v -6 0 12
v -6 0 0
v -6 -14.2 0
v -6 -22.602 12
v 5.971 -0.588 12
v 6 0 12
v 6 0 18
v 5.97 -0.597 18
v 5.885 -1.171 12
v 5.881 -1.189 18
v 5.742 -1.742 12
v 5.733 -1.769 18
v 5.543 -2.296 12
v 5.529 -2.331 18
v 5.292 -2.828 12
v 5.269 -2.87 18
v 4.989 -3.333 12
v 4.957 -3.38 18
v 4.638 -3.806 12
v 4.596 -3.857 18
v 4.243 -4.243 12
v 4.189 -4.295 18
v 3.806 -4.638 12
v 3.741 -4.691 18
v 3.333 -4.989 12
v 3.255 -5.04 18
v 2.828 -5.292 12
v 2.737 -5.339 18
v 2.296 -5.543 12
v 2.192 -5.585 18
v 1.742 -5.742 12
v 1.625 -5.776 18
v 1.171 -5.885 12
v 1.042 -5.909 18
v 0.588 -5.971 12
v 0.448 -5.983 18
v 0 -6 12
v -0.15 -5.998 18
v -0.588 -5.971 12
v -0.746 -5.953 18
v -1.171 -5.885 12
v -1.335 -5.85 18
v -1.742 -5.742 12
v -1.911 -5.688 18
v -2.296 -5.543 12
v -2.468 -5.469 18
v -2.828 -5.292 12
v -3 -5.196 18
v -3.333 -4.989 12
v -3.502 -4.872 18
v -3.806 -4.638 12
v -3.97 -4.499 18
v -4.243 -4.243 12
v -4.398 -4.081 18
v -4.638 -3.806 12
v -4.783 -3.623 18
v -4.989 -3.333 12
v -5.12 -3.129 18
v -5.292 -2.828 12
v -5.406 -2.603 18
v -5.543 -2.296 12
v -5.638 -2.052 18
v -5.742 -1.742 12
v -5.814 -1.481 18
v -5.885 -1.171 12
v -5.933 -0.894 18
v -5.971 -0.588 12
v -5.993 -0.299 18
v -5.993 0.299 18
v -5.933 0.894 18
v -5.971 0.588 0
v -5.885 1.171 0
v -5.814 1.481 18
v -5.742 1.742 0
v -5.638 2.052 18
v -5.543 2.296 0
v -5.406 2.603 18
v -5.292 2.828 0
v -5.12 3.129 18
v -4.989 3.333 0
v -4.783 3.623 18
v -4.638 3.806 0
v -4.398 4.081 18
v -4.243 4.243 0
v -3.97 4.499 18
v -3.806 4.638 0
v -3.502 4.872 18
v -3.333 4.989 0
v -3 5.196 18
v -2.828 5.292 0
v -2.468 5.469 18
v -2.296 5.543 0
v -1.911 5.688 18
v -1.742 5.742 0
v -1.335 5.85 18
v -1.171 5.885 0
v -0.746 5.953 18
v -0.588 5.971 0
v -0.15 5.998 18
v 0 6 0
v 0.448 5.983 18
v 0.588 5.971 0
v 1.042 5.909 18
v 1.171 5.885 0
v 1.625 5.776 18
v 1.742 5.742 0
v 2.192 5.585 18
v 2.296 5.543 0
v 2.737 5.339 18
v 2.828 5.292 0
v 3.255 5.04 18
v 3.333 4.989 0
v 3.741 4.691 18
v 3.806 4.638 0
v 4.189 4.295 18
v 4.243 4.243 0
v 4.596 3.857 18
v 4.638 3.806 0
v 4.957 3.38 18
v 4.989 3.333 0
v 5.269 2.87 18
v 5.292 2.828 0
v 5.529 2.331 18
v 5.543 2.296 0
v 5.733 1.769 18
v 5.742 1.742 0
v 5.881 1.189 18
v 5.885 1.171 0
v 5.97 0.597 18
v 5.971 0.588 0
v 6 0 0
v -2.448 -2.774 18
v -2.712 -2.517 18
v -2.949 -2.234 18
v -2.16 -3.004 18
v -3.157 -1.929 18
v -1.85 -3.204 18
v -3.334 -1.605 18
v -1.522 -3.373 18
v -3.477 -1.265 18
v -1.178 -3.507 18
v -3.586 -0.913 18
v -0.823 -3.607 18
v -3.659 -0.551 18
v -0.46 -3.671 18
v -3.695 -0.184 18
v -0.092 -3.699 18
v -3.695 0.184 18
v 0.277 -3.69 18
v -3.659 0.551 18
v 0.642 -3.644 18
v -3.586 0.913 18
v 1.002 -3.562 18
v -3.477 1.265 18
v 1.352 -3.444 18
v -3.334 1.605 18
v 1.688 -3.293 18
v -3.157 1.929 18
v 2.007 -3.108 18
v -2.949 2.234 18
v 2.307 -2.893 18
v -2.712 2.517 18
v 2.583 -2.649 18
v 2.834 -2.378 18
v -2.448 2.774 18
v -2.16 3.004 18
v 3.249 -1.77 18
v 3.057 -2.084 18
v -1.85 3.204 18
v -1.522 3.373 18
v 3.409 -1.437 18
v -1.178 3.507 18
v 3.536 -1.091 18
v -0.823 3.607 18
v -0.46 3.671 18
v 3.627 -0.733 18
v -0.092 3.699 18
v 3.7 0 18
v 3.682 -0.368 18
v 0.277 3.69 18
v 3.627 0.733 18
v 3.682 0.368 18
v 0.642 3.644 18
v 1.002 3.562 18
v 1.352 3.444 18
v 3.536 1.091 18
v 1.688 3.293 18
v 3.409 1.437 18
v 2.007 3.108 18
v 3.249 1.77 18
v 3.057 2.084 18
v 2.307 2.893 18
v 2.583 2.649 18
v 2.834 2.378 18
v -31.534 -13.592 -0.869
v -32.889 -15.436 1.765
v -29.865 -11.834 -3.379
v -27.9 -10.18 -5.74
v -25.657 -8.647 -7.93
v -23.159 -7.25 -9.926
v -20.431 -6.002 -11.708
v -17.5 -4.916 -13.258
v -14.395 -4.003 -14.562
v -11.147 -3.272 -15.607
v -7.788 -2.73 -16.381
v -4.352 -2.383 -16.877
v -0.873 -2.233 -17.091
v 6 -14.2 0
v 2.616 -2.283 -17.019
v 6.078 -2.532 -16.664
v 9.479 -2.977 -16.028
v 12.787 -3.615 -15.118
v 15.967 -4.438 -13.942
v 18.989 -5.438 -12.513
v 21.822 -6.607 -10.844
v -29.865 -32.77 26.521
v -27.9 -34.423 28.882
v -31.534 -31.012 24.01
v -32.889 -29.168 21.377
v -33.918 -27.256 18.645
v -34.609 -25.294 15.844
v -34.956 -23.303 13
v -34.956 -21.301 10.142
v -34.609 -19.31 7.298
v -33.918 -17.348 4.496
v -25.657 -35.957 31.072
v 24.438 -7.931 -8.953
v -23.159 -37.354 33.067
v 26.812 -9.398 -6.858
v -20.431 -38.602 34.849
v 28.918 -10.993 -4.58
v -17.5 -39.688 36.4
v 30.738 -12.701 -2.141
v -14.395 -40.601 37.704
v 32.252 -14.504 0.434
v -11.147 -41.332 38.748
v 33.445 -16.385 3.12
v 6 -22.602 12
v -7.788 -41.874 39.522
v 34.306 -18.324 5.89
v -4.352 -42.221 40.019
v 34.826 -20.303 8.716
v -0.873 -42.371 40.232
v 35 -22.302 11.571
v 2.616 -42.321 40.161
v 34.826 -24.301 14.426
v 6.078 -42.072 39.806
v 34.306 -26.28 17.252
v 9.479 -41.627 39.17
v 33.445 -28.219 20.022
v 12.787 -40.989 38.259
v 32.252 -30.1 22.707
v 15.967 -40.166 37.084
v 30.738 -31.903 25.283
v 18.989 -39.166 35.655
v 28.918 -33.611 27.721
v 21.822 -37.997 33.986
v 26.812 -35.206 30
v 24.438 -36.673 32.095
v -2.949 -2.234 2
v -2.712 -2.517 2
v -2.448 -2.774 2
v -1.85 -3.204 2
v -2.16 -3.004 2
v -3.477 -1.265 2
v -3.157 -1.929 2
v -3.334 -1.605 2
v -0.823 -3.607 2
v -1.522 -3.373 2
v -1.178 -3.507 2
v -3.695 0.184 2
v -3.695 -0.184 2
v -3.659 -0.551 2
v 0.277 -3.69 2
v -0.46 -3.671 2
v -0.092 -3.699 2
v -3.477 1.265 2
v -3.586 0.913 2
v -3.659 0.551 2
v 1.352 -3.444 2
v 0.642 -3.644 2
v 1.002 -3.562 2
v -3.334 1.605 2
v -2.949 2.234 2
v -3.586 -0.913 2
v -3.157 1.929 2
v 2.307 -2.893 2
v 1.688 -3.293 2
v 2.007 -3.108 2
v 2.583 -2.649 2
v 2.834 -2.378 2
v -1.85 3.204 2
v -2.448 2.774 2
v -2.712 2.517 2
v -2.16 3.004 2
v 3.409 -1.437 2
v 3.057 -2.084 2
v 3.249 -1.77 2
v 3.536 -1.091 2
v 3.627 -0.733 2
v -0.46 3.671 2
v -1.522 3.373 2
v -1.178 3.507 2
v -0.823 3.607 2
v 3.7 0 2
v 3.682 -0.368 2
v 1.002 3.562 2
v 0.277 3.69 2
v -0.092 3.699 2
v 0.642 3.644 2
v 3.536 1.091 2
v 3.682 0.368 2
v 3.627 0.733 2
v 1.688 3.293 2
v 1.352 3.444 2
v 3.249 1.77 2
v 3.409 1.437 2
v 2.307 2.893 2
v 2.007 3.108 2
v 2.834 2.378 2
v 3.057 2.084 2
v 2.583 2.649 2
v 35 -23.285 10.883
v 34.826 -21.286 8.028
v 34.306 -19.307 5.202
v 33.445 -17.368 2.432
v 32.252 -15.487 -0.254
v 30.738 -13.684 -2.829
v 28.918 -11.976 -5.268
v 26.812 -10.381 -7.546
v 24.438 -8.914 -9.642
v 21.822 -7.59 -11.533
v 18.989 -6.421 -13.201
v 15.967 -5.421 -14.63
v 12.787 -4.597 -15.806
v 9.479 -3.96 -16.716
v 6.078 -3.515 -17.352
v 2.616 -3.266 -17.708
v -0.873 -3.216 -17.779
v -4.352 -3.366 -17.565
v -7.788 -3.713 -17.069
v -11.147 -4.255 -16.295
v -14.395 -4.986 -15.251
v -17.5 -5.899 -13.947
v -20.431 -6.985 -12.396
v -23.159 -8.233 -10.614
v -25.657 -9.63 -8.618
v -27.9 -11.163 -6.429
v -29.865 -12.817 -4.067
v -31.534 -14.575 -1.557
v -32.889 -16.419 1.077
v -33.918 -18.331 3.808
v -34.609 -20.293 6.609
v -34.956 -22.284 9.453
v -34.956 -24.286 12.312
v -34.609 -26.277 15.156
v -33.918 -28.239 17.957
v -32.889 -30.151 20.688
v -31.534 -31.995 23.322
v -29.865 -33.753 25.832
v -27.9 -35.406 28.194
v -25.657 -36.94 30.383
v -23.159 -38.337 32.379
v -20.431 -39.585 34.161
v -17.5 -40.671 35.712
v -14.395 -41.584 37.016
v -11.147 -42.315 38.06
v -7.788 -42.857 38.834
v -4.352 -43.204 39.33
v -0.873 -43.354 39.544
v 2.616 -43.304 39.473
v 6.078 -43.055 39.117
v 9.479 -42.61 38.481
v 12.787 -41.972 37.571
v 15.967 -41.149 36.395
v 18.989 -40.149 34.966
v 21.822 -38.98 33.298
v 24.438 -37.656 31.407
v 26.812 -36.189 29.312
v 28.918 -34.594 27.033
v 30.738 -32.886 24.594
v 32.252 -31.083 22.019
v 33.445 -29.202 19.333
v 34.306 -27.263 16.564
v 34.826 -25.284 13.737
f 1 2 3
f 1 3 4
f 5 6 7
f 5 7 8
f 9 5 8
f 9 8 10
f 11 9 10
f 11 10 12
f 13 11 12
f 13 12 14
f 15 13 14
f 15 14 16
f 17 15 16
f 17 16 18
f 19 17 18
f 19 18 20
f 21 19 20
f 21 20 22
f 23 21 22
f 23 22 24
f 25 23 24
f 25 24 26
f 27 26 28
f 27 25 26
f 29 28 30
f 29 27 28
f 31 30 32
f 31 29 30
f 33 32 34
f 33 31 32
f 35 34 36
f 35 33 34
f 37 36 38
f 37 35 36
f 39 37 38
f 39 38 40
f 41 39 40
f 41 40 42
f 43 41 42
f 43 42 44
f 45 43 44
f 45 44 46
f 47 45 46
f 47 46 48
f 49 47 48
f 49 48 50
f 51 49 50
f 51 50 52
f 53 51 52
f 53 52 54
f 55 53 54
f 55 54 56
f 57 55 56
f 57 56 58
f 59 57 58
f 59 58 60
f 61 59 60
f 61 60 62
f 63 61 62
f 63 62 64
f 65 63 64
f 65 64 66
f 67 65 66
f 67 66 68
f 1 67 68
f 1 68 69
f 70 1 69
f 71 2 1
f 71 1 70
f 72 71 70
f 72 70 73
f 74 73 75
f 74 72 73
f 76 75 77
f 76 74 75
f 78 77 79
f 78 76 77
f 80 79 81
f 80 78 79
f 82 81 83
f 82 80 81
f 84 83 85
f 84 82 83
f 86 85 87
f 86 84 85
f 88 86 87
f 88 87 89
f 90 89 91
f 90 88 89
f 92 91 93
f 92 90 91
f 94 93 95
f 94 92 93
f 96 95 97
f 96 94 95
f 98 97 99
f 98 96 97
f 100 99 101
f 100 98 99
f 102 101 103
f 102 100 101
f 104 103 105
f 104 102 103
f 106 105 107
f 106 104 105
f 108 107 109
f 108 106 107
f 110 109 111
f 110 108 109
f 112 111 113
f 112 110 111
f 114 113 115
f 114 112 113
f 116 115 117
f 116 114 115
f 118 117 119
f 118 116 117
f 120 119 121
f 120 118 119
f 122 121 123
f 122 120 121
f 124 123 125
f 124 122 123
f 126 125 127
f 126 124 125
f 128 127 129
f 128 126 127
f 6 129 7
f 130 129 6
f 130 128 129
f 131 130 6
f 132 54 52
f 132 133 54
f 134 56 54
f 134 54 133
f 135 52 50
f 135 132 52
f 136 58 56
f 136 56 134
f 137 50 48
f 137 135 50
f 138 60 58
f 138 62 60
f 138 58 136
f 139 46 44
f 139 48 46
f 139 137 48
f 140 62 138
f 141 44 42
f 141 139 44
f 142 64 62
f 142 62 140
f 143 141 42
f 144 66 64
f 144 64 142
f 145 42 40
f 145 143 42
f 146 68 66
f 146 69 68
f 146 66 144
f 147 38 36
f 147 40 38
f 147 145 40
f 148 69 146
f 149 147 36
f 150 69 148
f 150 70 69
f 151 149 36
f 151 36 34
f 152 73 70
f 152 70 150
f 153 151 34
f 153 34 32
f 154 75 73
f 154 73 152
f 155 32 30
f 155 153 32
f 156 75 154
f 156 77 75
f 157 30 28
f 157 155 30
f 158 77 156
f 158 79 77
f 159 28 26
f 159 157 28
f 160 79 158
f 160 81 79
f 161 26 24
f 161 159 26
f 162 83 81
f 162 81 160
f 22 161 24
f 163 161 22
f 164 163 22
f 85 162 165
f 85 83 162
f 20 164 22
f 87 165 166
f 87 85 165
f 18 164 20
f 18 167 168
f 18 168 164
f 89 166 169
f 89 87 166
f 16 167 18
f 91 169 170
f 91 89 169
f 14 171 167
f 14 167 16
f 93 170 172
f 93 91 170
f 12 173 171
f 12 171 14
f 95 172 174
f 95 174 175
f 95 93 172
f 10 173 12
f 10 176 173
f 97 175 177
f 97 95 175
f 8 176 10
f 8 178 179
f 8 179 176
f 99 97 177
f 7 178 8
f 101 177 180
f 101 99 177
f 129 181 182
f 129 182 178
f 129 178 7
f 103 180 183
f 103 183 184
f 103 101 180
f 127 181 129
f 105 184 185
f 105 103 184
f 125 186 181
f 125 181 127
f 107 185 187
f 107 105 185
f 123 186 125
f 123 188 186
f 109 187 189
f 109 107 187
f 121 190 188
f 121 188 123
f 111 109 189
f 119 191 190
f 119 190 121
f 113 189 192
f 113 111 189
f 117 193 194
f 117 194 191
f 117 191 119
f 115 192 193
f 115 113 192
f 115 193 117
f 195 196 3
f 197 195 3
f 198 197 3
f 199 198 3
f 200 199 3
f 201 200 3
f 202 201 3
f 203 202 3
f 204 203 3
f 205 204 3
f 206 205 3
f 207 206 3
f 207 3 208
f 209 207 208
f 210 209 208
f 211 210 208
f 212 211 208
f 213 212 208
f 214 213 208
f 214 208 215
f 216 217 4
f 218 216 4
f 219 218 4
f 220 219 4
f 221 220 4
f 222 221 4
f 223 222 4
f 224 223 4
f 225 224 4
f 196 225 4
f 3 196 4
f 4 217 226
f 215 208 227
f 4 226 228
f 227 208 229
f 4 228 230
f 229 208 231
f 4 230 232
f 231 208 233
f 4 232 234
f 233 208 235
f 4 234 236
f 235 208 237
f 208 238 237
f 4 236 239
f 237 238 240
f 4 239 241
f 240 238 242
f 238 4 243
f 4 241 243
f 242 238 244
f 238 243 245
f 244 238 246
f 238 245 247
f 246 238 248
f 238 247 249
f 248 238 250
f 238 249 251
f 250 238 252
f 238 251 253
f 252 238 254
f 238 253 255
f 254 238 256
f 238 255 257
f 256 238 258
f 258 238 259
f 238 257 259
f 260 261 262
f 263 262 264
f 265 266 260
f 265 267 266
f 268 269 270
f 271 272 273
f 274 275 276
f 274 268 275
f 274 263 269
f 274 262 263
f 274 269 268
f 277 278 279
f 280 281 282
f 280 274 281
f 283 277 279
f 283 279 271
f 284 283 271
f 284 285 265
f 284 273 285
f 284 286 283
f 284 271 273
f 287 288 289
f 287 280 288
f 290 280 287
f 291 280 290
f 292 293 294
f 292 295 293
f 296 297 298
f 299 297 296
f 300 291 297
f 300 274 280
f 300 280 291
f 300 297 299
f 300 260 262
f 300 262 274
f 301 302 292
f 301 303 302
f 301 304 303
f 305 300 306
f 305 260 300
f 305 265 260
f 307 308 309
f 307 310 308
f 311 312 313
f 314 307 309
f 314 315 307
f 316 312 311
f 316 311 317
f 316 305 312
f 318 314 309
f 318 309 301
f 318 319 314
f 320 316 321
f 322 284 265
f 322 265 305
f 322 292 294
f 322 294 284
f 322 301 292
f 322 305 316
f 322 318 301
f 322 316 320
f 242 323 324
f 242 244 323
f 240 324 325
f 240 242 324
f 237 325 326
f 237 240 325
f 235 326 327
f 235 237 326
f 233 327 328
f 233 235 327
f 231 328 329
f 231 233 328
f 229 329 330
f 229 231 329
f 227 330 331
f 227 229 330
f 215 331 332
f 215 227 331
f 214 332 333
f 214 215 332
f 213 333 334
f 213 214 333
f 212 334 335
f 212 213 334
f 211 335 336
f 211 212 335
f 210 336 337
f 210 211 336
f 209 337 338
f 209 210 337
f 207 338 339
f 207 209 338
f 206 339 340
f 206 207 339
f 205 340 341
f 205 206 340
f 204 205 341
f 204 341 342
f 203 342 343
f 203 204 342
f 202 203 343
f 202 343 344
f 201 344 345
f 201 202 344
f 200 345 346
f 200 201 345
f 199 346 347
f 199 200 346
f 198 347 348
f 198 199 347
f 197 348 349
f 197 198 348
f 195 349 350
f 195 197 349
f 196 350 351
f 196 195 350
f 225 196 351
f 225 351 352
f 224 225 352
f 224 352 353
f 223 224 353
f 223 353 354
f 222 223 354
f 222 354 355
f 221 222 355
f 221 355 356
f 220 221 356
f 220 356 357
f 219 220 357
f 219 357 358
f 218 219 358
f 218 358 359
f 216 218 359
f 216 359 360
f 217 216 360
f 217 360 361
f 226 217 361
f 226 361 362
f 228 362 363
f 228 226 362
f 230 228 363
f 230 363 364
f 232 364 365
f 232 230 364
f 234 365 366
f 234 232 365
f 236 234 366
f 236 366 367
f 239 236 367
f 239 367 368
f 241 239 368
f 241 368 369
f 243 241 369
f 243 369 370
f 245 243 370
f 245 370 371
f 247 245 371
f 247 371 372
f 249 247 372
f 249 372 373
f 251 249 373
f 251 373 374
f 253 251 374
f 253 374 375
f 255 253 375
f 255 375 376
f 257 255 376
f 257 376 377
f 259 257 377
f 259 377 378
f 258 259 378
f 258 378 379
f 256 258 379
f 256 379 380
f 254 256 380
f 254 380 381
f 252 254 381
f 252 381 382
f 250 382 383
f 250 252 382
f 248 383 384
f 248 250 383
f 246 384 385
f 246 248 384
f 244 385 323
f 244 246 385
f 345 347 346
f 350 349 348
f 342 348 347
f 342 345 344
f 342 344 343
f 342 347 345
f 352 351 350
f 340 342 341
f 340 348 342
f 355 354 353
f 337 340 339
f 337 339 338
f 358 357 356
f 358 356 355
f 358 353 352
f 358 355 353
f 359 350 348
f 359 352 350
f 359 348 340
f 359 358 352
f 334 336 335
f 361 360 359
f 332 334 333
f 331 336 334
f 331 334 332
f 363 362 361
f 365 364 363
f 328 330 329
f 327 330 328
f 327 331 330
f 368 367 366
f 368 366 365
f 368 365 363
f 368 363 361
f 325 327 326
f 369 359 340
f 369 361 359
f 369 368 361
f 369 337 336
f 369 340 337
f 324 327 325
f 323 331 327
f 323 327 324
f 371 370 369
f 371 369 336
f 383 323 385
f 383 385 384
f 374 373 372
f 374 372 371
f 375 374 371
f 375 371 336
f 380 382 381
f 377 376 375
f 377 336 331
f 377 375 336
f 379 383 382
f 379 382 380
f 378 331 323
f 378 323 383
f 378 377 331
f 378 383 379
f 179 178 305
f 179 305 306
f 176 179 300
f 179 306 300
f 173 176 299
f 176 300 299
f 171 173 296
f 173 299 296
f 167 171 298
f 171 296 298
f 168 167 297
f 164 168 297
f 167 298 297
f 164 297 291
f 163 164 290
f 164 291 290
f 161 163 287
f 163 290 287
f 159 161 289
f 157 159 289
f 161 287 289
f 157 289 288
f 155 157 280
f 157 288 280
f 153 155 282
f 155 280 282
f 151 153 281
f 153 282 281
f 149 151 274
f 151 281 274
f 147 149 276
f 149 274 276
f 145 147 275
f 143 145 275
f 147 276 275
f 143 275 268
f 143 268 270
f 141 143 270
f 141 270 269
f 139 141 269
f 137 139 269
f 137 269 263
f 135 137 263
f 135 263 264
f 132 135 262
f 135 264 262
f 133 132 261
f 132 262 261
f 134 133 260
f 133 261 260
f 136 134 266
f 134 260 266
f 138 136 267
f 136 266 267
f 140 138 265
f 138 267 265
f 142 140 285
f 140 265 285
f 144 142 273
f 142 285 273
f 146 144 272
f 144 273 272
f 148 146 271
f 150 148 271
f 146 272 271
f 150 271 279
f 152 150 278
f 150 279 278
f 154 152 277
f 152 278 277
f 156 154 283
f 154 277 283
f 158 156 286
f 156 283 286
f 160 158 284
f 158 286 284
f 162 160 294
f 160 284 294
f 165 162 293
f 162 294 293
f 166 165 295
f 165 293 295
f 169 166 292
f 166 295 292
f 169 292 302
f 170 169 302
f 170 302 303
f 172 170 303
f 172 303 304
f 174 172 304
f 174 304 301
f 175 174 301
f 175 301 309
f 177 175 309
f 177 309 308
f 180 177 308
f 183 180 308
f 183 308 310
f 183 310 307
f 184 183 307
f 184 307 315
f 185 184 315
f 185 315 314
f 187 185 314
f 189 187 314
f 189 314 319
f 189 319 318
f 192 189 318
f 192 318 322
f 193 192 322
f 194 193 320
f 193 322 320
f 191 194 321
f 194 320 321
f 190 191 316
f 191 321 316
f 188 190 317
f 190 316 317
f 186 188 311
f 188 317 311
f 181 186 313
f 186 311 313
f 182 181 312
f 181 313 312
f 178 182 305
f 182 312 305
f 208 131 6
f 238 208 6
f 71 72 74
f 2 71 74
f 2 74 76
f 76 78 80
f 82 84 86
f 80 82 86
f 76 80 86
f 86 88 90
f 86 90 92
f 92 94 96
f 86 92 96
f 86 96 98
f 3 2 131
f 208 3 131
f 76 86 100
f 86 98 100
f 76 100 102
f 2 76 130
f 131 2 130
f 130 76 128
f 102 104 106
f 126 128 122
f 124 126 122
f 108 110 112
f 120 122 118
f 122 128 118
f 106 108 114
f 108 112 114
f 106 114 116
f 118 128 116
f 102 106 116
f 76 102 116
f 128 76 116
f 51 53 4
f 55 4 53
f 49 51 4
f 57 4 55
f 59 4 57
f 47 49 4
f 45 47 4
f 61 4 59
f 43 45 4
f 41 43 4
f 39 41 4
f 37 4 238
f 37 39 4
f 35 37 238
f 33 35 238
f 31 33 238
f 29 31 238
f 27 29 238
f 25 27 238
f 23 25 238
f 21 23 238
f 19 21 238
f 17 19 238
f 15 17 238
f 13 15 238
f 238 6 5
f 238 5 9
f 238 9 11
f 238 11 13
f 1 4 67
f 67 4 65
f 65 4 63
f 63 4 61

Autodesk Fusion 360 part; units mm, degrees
sketch "Sketch1" plane through (0, 0, 0) normal (0, 0, 1) x (1, 0, 0)
  circle A0 centre (0, 0) radius 3.7
  circle A1 centre (0, 0) radius 6
  line L0 (-25, -13.2) -> (25, -13.2)
  line L1 (25, -13.2) -> (25, -17.2)
  line L2 (25, -17.2) -> (-25, -17.2)
  line L3 (-25, -17.2) -> (-25, -13.2)
  line L4 (-6, 0) -> (6, 0)
  line L5 (6, 0) -> (6, -13.2)
  line L6 (6, -13.2) -> (-6, -13.2)
  line L7 (-6, -13.2) -> (-6, 0)
  point P0 (0, -13.2)
  dimension "d1" = 7.4
  dimension "d2" = 12
  dimension "d7" = 50
  dimension "d8" = 13.2
  dimension "d30" = 4
extrude "Extrude1" add sketch "Sketch1" along normal blind 2 contours A0 L4 | A0 A1 L4 | A0 A1 L4 | A0 L4
extrude "Extrude2" add sketch "Sketch1" along normal blind 18 contours A0 A1 L4 | A0 A1 L4
extrude "Extrude3" add sketch "Sketch1" along normal blind 12 contours A1 L0 L5 L6 L7
extrude "Extrude9" add 1 faces at (2, -13.2, 8) along direction (0, -1, 0) blind 1
draft "Draft1" angle 35 neutral plane through (-6, -13.2, 0) pull (0, 0, -1) 1 faces at (2, -14.2, 8)
sketch "Sketch5" plane through (0, -9.5283, -6.6718) normal (0, -0.819152, -0.573576) x (1, 0, 0)
  line L0 (-6, 8.1448) -> (6, 8.1448)
  line L1 (6, 8.1448) -> (6, 22.7941)
  line L2 (6, 22.7941) -> (-6, 22.7941)
  line L3 (-6, 22.7941) -> (-6, 8.1448)
  circle A0 centre (0, 22.2702) radius 35
  dimension "d44" = 70
extrude "Extrude10" add sketch "Sketch5" along normal blind 1.2 contours L0 L1 L2 L3 | A0
